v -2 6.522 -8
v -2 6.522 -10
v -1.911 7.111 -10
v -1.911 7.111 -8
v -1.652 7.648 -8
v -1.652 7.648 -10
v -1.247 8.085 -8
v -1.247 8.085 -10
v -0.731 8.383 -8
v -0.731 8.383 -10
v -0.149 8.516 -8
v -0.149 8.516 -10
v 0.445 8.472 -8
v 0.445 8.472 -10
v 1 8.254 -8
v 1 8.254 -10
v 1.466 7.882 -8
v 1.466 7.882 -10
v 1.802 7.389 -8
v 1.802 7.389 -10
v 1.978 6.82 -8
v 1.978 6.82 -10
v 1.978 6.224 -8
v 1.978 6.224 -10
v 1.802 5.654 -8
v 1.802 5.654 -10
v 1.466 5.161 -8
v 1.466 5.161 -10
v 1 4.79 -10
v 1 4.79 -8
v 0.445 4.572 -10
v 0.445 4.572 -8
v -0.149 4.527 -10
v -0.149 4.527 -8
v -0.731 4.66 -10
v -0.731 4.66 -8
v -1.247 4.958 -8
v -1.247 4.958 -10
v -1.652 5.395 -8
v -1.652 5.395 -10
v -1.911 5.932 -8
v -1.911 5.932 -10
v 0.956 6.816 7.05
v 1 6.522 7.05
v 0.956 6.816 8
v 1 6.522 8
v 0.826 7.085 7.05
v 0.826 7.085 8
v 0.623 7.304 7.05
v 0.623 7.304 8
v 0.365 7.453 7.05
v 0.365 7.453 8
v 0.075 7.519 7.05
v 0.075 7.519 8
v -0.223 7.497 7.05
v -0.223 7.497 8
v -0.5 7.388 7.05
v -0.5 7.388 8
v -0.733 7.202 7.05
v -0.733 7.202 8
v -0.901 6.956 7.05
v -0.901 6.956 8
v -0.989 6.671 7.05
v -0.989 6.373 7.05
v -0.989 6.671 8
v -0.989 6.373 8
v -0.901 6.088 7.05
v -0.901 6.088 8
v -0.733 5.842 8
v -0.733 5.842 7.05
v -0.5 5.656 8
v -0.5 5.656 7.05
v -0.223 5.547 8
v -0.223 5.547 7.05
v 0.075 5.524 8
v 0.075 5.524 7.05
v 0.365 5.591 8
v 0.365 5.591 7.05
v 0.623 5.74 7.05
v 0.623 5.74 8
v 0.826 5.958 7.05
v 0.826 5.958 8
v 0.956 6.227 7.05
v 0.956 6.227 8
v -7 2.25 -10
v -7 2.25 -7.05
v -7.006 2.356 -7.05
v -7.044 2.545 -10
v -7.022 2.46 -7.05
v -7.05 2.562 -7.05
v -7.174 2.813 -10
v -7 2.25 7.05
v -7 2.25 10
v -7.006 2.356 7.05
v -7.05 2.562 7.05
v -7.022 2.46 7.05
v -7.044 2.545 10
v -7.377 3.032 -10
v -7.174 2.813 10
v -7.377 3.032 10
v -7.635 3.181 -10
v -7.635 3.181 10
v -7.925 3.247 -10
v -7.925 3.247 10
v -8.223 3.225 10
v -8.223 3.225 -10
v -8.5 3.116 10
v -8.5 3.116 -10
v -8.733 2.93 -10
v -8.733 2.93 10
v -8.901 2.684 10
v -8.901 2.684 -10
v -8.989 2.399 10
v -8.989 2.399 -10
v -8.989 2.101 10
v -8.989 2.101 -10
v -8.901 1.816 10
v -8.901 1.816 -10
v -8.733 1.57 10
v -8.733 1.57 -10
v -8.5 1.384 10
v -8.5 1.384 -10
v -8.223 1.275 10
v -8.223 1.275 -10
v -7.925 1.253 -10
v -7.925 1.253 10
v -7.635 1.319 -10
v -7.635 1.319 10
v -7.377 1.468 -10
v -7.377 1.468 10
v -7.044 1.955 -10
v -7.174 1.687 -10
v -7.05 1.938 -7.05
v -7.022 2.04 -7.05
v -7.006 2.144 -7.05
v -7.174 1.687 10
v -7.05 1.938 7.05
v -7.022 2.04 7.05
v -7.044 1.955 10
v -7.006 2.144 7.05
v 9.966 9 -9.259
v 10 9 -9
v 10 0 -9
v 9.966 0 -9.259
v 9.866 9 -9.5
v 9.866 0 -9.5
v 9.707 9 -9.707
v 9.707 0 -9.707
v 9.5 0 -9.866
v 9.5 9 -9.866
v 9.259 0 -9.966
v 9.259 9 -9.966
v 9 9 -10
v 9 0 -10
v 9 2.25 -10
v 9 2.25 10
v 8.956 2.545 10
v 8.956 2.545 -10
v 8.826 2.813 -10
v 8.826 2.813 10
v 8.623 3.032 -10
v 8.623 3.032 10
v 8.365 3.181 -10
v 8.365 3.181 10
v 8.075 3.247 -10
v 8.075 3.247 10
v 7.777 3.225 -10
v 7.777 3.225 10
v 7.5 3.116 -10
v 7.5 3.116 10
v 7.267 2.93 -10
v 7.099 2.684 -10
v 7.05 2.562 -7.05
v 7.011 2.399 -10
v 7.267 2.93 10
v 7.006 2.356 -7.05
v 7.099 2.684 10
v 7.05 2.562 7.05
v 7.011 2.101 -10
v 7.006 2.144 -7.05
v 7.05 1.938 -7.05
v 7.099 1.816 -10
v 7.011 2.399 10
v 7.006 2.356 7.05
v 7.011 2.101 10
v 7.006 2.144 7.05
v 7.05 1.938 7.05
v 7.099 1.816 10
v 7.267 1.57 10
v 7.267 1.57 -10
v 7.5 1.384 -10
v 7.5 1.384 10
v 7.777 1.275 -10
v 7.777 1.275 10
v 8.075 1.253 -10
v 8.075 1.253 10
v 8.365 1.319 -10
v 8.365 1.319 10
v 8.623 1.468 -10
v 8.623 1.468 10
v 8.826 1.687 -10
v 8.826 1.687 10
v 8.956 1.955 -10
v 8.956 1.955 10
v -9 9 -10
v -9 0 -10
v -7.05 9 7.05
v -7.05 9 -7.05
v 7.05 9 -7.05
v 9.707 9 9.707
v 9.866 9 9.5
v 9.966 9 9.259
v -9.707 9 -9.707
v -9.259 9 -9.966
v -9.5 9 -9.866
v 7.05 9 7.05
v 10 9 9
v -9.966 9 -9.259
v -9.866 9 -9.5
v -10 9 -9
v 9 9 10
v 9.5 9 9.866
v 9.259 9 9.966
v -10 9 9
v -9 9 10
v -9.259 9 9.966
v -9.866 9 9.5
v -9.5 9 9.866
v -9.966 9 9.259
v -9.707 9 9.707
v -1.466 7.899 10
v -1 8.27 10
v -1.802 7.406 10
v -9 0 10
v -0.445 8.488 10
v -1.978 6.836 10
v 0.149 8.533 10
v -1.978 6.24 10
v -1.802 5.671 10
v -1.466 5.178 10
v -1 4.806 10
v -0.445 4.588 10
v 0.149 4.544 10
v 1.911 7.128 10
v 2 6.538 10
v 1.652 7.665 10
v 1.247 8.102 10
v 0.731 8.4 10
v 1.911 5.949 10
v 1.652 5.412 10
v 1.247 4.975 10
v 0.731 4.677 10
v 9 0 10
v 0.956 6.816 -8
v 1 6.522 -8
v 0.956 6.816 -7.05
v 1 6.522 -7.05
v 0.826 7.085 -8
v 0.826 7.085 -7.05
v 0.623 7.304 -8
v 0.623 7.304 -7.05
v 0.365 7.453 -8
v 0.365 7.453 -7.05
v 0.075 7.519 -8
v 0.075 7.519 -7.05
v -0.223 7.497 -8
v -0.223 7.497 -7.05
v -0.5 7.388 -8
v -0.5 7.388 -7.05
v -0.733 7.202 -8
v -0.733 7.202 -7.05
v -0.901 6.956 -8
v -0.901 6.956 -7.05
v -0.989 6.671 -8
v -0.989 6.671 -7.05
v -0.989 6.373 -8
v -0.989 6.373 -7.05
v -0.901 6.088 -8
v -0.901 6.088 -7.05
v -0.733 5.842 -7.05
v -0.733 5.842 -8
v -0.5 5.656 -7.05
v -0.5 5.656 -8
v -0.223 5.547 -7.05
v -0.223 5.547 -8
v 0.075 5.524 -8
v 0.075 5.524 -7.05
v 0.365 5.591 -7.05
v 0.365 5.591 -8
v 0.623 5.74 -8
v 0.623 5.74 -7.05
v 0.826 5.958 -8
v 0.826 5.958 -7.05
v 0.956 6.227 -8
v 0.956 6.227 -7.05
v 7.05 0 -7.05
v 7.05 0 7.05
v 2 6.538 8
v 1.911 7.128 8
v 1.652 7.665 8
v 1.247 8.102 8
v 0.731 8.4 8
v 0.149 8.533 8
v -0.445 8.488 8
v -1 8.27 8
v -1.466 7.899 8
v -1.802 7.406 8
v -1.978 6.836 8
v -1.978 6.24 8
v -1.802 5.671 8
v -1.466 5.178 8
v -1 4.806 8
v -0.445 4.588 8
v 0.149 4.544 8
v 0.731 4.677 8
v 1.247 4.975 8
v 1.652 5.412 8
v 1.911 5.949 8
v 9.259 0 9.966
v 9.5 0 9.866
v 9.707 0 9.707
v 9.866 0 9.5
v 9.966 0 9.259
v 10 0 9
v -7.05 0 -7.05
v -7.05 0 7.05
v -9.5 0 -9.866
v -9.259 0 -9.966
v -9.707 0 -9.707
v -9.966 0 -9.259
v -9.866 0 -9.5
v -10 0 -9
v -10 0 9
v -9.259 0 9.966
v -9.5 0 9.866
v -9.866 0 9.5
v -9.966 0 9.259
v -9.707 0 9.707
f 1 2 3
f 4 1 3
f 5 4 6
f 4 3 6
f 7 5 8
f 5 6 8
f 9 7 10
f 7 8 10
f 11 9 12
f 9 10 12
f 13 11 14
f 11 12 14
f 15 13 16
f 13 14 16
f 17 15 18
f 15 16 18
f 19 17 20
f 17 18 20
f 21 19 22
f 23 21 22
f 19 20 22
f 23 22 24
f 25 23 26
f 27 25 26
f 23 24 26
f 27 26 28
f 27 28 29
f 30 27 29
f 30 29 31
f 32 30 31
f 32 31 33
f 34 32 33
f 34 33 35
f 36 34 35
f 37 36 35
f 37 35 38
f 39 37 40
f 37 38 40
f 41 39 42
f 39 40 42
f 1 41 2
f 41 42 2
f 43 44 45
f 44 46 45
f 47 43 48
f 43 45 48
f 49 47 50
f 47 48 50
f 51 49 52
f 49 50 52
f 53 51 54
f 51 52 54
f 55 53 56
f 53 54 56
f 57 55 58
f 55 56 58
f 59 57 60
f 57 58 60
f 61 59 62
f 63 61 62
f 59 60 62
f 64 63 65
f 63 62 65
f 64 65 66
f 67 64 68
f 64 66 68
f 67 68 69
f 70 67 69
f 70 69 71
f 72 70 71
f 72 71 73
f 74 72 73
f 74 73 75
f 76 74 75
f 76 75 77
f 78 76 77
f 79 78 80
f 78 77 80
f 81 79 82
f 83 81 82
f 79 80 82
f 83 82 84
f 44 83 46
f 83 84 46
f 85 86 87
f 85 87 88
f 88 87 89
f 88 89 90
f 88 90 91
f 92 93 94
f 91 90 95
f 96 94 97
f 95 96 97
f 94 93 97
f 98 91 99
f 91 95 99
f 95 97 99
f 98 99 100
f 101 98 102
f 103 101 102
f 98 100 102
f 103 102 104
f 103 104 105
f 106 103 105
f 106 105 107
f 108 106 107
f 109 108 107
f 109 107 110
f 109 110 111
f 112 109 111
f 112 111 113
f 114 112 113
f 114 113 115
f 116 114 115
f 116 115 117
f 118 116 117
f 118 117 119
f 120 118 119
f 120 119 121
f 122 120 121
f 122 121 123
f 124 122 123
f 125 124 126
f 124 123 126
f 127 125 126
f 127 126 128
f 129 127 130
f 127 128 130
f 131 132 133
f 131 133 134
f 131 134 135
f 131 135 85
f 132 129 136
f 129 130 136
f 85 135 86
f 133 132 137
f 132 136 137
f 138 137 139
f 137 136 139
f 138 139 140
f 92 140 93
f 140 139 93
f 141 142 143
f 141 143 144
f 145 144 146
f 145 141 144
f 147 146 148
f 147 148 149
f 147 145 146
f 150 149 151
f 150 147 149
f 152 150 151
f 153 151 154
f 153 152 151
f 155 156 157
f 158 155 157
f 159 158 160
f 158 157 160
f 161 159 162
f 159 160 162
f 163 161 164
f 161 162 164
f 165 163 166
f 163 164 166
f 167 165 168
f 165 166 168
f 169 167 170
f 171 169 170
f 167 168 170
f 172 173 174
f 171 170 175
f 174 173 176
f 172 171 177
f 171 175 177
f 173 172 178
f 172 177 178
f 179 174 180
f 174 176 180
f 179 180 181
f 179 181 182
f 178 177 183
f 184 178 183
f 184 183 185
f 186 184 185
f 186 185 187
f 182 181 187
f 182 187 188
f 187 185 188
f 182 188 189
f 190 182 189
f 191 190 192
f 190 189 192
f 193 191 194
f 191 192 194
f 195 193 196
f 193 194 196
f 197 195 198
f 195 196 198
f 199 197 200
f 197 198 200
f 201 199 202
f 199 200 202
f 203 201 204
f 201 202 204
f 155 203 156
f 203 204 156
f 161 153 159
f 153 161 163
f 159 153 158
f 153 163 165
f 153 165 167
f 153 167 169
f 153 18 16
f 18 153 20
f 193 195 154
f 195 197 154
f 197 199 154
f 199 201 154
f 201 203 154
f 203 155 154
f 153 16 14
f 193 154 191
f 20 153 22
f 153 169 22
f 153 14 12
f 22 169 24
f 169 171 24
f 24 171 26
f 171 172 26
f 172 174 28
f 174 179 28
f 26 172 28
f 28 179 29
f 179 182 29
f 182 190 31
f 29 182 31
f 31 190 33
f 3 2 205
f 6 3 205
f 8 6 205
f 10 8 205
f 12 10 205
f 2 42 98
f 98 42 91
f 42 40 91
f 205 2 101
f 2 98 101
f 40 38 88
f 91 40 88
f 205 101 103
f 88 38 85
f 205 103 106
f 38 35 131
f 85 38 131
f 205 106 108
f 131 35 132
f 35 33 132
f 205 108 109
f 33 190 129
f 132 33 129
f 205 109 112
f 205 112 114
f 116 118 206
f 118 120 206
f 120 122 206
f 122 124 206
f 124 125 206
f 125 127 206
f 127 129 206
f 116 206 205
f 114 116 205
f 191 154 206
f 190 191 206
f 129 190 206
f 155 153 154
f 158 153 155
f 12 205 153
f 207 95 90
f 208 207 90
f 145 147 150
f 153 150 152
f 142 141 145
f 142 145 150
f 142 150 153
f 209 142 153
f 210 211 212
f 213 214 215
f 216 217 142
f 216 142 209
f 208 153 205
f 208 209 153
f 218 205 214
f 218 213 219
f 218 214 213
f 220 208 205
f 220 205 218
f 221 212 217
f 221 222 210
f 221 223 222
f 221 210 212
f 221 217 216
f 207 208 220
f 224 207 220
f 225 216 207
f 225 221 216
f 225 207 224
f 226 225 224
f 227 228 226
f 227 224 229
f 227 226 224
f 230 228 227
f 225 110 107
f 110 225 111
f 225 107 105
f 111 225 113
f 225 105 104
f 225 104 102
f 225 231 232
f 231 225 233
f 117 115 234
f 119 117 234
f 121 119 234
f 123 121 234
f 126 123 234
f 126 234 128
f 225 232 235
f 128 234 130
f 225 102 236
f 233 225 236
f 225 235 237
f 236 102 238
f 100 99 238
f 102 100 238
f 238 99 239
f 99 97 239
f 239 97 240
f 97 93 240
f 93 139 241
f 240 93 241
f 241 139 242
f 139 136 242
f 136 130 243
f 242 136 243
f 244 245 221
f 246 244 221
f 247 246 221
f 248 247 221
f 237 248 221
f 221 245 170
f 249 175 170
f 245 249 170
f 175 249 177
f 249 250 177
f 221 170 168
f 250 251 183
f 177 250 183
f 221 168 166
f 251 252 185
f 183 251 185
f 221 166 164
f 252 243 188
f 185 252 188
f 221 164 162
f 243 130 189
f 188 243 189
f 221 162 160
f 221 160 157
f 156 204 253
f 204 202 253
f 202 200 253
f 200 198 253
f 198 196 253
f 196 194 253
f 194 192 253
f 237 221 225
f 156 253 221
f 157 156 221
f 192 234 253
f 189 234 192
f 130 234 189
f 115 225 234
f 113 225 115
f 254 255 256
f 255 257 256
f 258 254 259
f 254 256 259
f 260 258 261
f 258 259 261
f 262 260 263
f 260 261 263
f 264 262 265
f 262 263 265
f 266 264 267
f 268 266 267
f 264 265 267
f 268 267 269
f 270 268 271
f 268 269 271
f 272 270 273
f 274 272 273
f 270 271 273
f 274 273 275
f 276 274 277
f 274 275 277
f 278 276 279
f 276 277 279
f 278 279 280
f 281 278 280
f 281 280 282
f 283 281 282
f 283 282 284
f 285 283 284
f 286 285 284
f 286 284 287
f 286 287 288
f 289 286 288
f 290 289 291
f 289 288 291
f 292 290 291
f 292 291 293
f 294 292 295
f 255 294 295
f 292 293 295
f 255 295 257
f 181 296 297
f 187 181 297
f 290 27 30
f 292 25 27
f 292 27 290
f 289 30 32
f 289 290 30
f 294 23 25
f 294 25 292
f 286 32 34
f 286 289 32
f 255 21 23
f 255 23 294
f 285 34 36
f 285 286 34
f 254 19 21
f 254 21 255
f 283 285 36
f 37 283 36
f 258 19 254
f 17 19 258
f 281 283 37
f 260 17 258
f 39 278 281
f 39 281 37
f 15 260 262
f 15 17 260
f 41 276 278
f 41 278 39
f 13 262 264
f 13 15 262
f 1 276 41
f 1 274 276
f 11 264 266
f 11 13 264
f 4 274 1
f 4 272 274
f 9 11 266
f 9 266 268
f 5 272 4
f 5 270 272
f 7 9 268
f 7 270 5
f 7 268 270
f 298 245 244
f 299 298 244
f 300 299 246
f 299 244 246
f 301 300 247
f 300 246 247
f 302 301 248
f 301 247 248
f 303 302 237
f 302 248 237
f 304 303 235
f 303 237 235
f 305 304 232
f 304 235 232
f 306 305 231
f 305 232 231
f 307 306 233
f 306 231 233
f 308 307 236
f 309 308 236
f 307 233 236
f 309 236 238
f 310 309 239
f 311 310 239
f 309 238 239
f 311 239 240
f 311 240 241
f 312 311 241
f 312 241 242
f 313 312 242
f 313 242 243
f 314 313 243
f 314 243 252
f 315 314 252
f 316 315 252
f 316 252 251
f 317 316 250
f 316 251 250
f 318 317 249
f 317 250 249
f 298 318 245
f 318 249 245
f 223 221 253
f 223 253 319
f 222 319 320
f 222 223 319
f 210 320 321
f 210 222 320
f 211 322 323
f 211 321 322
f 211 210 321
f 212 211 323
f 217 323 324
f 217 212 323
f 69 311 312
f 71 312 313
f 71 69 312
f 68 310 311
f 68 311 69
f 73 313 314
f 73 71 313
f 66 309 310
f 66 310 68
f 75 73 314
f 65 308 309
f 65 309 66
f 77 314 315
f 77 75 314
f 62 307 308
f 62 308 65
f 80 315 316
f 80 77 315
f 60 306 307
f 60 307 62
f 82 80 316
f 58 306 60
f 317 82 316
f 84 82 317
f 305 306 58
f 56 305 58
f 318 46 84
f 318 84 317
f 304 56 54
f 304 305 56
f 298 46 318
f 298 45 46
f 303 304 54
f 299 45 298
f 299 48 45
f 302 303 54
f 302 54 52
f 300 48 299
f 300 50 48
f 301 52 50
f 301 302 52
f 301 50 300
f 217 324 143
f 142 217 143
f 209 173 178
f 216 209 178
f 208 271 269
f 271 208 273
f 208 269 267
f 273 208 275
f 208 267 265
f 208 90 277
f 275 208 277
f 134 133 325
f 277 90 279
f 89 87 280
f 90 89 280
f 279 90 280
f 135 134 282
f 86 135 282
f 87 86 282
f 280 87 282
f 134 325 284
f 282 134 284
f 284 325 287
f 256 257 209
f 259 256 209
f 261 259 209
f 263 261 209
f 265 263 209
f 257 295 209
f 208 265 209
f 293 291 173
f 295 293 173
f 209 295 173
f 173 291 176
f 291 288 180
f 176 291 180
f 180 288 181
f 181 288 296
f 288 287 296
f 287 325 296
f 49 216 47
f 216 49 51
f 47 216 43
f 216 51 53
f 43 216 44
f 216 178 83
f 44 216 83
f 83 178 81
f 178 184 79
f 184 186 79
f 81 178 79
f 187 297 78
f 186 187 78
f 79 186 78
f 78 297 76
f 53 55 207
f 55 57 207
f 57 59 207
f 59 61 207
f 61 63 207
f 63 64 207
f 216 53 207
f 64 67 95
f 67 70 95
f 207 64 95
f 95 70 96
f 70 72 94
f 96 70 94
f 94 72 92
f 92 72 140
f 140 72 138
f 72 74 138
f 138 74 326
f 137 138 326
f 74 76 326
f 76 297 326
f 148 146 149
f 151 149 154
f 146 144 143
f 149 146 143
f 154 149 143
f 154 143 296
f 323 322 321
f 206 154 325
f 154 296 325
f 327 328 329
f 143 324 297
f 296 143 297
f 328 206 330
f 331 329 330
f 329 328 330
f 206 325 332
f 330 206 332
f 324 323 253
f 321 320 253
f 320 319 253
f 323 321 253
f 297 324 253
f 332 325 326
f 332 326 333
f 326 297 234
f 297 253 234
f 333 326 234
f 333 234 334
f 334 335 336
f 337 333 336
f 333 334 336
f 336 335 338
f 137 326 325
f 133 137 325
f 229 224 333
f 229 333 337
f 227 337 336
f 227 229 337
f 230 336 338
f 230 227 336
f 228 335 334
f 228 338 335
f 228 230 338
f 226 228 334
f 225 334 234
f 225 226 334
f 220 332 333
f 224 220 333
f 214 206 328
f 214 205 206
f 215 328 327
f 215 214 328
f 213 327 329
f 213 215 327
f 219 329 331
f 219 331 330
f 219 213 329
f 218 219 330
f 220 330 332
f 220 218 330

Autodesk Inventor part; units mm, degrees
ref_plane "YZ Plane" through (0, 0, 0) normal (1, 0, 0) x (0, 1, 0)
ref_plane "XZ Plane" through (0, 0, 0) normal (0, 1, 0) x (-1, 0, 0)
ref_plane "XY Plane" through (0, 0, 0) normal (0, 0, 1) x (1, 0, 0)
sketch "Эскиз1" plane through (0, 0, 0) normal (0, 1, 0) x (-1, 0, 0)
  line L0 (7.05, -7.05) -> (-7.05, -7.05)
  line L1 (-7.05, -7.05) -> (-7.05, 7.05)
  line L2 (-7.05, 7.05) -> (7.05, 7.05)
  line L3 (7.05, 7.05) -> (7.05, -7.05)
  line L4 (7.05, -7.05) -> (-7.05, 7.05) construction
  line L5 (-7.05, -7.05) -> (7.05, 7.05) construction
  line L6 (-10, -10) -> (10, -10)
  line L7 (10, -10) -> (10, 10)
  line L8 (10, 10) -> (-10, 10)
  line L9 (-10, 10) -> (-10, -10)
  line L10 (-10, -10) -> (10, 10) construction
  line L11 (10, -10) -> (-10, 10) construction
  point P0 (0, 0)
  dimension "d0" = 14.1
  dimension "d1" = 14.1
  dimension "d2" = 20
  dimension "d3" = 20
extrude "Выдавливание1" add sketch "Эскиз1" along normal blind 9
sketch "Эскиз2" plane through (-10, 0, 10) normal (0, 0, 1) x (1, 0, 0)
  line L0 (0, 0) -> (0, 9) projected
  line L1 (20, 9) -> (0, 9) projected
  line L2 (0, 0) -> (20, 9)
  line L3 (0, 9) -> (20, 0)
  line L4 (0, 4.5) -> (20, 4.5)
  line L5 (20, 0) -> (0, 0) projected
  line L6 (20, 4.5) -> (0, 0)
  line L7 (0, 4.5) -> (20, 0)
  line L8 (10, 2.25) -> (2, 2.25)
  line L9 (2, 2.25) -> (18, 2.25)
  circle A0 centre (2, 2.25) radius 1
  circle A1 centre (18, 2.25) radius 1
  circle A2 centre (10, 6.5217) radius 1
  circle A3 centre (10, 6.5217) radius 2
  point P0 (10, 0)
  dimension "d6" = 8
  dimension "d7" = 16
  dimension "d8" = 2
  dimension "d9" = 2
  dimension "d10" = 2
  dimension "d11" = 4
sketch "Эскиз3" plane through (-10, 0, 10) normal (0, 0, 1) x (1, 0, 0)
  circle A0 centre (10, 6.5383) radius 2
  point P0 (10, 0)
  dimension "d12" = 4
extrude "Выдавливание2" cut sketch "Эскиз2" against normal blind 25 contours A1 | A0 | A2
sketch "Эскиз4" plane through (10, 0, -10) normal (0, 0, -1) x (-1, 0, 0)
  circle A0 centre (10, 6.5217) radius 1 projected
  circle A1 centre (10, 6.5217) radius 2
  point P0 (10, 0)
  dimension "d15" = 4
extrude "Выдавливание3" cut sketch "Эскиз3" against normal blind 2
extrude "Выдавливание4" cut sketch "Эскиз4" against normal blind 2
fillet "Сопряжение1" radius 1 4 edges at (-10, 4.5, 10) (10, 4.5, 10) (10, 4.5, -10) (-10, 4.5, -10)
